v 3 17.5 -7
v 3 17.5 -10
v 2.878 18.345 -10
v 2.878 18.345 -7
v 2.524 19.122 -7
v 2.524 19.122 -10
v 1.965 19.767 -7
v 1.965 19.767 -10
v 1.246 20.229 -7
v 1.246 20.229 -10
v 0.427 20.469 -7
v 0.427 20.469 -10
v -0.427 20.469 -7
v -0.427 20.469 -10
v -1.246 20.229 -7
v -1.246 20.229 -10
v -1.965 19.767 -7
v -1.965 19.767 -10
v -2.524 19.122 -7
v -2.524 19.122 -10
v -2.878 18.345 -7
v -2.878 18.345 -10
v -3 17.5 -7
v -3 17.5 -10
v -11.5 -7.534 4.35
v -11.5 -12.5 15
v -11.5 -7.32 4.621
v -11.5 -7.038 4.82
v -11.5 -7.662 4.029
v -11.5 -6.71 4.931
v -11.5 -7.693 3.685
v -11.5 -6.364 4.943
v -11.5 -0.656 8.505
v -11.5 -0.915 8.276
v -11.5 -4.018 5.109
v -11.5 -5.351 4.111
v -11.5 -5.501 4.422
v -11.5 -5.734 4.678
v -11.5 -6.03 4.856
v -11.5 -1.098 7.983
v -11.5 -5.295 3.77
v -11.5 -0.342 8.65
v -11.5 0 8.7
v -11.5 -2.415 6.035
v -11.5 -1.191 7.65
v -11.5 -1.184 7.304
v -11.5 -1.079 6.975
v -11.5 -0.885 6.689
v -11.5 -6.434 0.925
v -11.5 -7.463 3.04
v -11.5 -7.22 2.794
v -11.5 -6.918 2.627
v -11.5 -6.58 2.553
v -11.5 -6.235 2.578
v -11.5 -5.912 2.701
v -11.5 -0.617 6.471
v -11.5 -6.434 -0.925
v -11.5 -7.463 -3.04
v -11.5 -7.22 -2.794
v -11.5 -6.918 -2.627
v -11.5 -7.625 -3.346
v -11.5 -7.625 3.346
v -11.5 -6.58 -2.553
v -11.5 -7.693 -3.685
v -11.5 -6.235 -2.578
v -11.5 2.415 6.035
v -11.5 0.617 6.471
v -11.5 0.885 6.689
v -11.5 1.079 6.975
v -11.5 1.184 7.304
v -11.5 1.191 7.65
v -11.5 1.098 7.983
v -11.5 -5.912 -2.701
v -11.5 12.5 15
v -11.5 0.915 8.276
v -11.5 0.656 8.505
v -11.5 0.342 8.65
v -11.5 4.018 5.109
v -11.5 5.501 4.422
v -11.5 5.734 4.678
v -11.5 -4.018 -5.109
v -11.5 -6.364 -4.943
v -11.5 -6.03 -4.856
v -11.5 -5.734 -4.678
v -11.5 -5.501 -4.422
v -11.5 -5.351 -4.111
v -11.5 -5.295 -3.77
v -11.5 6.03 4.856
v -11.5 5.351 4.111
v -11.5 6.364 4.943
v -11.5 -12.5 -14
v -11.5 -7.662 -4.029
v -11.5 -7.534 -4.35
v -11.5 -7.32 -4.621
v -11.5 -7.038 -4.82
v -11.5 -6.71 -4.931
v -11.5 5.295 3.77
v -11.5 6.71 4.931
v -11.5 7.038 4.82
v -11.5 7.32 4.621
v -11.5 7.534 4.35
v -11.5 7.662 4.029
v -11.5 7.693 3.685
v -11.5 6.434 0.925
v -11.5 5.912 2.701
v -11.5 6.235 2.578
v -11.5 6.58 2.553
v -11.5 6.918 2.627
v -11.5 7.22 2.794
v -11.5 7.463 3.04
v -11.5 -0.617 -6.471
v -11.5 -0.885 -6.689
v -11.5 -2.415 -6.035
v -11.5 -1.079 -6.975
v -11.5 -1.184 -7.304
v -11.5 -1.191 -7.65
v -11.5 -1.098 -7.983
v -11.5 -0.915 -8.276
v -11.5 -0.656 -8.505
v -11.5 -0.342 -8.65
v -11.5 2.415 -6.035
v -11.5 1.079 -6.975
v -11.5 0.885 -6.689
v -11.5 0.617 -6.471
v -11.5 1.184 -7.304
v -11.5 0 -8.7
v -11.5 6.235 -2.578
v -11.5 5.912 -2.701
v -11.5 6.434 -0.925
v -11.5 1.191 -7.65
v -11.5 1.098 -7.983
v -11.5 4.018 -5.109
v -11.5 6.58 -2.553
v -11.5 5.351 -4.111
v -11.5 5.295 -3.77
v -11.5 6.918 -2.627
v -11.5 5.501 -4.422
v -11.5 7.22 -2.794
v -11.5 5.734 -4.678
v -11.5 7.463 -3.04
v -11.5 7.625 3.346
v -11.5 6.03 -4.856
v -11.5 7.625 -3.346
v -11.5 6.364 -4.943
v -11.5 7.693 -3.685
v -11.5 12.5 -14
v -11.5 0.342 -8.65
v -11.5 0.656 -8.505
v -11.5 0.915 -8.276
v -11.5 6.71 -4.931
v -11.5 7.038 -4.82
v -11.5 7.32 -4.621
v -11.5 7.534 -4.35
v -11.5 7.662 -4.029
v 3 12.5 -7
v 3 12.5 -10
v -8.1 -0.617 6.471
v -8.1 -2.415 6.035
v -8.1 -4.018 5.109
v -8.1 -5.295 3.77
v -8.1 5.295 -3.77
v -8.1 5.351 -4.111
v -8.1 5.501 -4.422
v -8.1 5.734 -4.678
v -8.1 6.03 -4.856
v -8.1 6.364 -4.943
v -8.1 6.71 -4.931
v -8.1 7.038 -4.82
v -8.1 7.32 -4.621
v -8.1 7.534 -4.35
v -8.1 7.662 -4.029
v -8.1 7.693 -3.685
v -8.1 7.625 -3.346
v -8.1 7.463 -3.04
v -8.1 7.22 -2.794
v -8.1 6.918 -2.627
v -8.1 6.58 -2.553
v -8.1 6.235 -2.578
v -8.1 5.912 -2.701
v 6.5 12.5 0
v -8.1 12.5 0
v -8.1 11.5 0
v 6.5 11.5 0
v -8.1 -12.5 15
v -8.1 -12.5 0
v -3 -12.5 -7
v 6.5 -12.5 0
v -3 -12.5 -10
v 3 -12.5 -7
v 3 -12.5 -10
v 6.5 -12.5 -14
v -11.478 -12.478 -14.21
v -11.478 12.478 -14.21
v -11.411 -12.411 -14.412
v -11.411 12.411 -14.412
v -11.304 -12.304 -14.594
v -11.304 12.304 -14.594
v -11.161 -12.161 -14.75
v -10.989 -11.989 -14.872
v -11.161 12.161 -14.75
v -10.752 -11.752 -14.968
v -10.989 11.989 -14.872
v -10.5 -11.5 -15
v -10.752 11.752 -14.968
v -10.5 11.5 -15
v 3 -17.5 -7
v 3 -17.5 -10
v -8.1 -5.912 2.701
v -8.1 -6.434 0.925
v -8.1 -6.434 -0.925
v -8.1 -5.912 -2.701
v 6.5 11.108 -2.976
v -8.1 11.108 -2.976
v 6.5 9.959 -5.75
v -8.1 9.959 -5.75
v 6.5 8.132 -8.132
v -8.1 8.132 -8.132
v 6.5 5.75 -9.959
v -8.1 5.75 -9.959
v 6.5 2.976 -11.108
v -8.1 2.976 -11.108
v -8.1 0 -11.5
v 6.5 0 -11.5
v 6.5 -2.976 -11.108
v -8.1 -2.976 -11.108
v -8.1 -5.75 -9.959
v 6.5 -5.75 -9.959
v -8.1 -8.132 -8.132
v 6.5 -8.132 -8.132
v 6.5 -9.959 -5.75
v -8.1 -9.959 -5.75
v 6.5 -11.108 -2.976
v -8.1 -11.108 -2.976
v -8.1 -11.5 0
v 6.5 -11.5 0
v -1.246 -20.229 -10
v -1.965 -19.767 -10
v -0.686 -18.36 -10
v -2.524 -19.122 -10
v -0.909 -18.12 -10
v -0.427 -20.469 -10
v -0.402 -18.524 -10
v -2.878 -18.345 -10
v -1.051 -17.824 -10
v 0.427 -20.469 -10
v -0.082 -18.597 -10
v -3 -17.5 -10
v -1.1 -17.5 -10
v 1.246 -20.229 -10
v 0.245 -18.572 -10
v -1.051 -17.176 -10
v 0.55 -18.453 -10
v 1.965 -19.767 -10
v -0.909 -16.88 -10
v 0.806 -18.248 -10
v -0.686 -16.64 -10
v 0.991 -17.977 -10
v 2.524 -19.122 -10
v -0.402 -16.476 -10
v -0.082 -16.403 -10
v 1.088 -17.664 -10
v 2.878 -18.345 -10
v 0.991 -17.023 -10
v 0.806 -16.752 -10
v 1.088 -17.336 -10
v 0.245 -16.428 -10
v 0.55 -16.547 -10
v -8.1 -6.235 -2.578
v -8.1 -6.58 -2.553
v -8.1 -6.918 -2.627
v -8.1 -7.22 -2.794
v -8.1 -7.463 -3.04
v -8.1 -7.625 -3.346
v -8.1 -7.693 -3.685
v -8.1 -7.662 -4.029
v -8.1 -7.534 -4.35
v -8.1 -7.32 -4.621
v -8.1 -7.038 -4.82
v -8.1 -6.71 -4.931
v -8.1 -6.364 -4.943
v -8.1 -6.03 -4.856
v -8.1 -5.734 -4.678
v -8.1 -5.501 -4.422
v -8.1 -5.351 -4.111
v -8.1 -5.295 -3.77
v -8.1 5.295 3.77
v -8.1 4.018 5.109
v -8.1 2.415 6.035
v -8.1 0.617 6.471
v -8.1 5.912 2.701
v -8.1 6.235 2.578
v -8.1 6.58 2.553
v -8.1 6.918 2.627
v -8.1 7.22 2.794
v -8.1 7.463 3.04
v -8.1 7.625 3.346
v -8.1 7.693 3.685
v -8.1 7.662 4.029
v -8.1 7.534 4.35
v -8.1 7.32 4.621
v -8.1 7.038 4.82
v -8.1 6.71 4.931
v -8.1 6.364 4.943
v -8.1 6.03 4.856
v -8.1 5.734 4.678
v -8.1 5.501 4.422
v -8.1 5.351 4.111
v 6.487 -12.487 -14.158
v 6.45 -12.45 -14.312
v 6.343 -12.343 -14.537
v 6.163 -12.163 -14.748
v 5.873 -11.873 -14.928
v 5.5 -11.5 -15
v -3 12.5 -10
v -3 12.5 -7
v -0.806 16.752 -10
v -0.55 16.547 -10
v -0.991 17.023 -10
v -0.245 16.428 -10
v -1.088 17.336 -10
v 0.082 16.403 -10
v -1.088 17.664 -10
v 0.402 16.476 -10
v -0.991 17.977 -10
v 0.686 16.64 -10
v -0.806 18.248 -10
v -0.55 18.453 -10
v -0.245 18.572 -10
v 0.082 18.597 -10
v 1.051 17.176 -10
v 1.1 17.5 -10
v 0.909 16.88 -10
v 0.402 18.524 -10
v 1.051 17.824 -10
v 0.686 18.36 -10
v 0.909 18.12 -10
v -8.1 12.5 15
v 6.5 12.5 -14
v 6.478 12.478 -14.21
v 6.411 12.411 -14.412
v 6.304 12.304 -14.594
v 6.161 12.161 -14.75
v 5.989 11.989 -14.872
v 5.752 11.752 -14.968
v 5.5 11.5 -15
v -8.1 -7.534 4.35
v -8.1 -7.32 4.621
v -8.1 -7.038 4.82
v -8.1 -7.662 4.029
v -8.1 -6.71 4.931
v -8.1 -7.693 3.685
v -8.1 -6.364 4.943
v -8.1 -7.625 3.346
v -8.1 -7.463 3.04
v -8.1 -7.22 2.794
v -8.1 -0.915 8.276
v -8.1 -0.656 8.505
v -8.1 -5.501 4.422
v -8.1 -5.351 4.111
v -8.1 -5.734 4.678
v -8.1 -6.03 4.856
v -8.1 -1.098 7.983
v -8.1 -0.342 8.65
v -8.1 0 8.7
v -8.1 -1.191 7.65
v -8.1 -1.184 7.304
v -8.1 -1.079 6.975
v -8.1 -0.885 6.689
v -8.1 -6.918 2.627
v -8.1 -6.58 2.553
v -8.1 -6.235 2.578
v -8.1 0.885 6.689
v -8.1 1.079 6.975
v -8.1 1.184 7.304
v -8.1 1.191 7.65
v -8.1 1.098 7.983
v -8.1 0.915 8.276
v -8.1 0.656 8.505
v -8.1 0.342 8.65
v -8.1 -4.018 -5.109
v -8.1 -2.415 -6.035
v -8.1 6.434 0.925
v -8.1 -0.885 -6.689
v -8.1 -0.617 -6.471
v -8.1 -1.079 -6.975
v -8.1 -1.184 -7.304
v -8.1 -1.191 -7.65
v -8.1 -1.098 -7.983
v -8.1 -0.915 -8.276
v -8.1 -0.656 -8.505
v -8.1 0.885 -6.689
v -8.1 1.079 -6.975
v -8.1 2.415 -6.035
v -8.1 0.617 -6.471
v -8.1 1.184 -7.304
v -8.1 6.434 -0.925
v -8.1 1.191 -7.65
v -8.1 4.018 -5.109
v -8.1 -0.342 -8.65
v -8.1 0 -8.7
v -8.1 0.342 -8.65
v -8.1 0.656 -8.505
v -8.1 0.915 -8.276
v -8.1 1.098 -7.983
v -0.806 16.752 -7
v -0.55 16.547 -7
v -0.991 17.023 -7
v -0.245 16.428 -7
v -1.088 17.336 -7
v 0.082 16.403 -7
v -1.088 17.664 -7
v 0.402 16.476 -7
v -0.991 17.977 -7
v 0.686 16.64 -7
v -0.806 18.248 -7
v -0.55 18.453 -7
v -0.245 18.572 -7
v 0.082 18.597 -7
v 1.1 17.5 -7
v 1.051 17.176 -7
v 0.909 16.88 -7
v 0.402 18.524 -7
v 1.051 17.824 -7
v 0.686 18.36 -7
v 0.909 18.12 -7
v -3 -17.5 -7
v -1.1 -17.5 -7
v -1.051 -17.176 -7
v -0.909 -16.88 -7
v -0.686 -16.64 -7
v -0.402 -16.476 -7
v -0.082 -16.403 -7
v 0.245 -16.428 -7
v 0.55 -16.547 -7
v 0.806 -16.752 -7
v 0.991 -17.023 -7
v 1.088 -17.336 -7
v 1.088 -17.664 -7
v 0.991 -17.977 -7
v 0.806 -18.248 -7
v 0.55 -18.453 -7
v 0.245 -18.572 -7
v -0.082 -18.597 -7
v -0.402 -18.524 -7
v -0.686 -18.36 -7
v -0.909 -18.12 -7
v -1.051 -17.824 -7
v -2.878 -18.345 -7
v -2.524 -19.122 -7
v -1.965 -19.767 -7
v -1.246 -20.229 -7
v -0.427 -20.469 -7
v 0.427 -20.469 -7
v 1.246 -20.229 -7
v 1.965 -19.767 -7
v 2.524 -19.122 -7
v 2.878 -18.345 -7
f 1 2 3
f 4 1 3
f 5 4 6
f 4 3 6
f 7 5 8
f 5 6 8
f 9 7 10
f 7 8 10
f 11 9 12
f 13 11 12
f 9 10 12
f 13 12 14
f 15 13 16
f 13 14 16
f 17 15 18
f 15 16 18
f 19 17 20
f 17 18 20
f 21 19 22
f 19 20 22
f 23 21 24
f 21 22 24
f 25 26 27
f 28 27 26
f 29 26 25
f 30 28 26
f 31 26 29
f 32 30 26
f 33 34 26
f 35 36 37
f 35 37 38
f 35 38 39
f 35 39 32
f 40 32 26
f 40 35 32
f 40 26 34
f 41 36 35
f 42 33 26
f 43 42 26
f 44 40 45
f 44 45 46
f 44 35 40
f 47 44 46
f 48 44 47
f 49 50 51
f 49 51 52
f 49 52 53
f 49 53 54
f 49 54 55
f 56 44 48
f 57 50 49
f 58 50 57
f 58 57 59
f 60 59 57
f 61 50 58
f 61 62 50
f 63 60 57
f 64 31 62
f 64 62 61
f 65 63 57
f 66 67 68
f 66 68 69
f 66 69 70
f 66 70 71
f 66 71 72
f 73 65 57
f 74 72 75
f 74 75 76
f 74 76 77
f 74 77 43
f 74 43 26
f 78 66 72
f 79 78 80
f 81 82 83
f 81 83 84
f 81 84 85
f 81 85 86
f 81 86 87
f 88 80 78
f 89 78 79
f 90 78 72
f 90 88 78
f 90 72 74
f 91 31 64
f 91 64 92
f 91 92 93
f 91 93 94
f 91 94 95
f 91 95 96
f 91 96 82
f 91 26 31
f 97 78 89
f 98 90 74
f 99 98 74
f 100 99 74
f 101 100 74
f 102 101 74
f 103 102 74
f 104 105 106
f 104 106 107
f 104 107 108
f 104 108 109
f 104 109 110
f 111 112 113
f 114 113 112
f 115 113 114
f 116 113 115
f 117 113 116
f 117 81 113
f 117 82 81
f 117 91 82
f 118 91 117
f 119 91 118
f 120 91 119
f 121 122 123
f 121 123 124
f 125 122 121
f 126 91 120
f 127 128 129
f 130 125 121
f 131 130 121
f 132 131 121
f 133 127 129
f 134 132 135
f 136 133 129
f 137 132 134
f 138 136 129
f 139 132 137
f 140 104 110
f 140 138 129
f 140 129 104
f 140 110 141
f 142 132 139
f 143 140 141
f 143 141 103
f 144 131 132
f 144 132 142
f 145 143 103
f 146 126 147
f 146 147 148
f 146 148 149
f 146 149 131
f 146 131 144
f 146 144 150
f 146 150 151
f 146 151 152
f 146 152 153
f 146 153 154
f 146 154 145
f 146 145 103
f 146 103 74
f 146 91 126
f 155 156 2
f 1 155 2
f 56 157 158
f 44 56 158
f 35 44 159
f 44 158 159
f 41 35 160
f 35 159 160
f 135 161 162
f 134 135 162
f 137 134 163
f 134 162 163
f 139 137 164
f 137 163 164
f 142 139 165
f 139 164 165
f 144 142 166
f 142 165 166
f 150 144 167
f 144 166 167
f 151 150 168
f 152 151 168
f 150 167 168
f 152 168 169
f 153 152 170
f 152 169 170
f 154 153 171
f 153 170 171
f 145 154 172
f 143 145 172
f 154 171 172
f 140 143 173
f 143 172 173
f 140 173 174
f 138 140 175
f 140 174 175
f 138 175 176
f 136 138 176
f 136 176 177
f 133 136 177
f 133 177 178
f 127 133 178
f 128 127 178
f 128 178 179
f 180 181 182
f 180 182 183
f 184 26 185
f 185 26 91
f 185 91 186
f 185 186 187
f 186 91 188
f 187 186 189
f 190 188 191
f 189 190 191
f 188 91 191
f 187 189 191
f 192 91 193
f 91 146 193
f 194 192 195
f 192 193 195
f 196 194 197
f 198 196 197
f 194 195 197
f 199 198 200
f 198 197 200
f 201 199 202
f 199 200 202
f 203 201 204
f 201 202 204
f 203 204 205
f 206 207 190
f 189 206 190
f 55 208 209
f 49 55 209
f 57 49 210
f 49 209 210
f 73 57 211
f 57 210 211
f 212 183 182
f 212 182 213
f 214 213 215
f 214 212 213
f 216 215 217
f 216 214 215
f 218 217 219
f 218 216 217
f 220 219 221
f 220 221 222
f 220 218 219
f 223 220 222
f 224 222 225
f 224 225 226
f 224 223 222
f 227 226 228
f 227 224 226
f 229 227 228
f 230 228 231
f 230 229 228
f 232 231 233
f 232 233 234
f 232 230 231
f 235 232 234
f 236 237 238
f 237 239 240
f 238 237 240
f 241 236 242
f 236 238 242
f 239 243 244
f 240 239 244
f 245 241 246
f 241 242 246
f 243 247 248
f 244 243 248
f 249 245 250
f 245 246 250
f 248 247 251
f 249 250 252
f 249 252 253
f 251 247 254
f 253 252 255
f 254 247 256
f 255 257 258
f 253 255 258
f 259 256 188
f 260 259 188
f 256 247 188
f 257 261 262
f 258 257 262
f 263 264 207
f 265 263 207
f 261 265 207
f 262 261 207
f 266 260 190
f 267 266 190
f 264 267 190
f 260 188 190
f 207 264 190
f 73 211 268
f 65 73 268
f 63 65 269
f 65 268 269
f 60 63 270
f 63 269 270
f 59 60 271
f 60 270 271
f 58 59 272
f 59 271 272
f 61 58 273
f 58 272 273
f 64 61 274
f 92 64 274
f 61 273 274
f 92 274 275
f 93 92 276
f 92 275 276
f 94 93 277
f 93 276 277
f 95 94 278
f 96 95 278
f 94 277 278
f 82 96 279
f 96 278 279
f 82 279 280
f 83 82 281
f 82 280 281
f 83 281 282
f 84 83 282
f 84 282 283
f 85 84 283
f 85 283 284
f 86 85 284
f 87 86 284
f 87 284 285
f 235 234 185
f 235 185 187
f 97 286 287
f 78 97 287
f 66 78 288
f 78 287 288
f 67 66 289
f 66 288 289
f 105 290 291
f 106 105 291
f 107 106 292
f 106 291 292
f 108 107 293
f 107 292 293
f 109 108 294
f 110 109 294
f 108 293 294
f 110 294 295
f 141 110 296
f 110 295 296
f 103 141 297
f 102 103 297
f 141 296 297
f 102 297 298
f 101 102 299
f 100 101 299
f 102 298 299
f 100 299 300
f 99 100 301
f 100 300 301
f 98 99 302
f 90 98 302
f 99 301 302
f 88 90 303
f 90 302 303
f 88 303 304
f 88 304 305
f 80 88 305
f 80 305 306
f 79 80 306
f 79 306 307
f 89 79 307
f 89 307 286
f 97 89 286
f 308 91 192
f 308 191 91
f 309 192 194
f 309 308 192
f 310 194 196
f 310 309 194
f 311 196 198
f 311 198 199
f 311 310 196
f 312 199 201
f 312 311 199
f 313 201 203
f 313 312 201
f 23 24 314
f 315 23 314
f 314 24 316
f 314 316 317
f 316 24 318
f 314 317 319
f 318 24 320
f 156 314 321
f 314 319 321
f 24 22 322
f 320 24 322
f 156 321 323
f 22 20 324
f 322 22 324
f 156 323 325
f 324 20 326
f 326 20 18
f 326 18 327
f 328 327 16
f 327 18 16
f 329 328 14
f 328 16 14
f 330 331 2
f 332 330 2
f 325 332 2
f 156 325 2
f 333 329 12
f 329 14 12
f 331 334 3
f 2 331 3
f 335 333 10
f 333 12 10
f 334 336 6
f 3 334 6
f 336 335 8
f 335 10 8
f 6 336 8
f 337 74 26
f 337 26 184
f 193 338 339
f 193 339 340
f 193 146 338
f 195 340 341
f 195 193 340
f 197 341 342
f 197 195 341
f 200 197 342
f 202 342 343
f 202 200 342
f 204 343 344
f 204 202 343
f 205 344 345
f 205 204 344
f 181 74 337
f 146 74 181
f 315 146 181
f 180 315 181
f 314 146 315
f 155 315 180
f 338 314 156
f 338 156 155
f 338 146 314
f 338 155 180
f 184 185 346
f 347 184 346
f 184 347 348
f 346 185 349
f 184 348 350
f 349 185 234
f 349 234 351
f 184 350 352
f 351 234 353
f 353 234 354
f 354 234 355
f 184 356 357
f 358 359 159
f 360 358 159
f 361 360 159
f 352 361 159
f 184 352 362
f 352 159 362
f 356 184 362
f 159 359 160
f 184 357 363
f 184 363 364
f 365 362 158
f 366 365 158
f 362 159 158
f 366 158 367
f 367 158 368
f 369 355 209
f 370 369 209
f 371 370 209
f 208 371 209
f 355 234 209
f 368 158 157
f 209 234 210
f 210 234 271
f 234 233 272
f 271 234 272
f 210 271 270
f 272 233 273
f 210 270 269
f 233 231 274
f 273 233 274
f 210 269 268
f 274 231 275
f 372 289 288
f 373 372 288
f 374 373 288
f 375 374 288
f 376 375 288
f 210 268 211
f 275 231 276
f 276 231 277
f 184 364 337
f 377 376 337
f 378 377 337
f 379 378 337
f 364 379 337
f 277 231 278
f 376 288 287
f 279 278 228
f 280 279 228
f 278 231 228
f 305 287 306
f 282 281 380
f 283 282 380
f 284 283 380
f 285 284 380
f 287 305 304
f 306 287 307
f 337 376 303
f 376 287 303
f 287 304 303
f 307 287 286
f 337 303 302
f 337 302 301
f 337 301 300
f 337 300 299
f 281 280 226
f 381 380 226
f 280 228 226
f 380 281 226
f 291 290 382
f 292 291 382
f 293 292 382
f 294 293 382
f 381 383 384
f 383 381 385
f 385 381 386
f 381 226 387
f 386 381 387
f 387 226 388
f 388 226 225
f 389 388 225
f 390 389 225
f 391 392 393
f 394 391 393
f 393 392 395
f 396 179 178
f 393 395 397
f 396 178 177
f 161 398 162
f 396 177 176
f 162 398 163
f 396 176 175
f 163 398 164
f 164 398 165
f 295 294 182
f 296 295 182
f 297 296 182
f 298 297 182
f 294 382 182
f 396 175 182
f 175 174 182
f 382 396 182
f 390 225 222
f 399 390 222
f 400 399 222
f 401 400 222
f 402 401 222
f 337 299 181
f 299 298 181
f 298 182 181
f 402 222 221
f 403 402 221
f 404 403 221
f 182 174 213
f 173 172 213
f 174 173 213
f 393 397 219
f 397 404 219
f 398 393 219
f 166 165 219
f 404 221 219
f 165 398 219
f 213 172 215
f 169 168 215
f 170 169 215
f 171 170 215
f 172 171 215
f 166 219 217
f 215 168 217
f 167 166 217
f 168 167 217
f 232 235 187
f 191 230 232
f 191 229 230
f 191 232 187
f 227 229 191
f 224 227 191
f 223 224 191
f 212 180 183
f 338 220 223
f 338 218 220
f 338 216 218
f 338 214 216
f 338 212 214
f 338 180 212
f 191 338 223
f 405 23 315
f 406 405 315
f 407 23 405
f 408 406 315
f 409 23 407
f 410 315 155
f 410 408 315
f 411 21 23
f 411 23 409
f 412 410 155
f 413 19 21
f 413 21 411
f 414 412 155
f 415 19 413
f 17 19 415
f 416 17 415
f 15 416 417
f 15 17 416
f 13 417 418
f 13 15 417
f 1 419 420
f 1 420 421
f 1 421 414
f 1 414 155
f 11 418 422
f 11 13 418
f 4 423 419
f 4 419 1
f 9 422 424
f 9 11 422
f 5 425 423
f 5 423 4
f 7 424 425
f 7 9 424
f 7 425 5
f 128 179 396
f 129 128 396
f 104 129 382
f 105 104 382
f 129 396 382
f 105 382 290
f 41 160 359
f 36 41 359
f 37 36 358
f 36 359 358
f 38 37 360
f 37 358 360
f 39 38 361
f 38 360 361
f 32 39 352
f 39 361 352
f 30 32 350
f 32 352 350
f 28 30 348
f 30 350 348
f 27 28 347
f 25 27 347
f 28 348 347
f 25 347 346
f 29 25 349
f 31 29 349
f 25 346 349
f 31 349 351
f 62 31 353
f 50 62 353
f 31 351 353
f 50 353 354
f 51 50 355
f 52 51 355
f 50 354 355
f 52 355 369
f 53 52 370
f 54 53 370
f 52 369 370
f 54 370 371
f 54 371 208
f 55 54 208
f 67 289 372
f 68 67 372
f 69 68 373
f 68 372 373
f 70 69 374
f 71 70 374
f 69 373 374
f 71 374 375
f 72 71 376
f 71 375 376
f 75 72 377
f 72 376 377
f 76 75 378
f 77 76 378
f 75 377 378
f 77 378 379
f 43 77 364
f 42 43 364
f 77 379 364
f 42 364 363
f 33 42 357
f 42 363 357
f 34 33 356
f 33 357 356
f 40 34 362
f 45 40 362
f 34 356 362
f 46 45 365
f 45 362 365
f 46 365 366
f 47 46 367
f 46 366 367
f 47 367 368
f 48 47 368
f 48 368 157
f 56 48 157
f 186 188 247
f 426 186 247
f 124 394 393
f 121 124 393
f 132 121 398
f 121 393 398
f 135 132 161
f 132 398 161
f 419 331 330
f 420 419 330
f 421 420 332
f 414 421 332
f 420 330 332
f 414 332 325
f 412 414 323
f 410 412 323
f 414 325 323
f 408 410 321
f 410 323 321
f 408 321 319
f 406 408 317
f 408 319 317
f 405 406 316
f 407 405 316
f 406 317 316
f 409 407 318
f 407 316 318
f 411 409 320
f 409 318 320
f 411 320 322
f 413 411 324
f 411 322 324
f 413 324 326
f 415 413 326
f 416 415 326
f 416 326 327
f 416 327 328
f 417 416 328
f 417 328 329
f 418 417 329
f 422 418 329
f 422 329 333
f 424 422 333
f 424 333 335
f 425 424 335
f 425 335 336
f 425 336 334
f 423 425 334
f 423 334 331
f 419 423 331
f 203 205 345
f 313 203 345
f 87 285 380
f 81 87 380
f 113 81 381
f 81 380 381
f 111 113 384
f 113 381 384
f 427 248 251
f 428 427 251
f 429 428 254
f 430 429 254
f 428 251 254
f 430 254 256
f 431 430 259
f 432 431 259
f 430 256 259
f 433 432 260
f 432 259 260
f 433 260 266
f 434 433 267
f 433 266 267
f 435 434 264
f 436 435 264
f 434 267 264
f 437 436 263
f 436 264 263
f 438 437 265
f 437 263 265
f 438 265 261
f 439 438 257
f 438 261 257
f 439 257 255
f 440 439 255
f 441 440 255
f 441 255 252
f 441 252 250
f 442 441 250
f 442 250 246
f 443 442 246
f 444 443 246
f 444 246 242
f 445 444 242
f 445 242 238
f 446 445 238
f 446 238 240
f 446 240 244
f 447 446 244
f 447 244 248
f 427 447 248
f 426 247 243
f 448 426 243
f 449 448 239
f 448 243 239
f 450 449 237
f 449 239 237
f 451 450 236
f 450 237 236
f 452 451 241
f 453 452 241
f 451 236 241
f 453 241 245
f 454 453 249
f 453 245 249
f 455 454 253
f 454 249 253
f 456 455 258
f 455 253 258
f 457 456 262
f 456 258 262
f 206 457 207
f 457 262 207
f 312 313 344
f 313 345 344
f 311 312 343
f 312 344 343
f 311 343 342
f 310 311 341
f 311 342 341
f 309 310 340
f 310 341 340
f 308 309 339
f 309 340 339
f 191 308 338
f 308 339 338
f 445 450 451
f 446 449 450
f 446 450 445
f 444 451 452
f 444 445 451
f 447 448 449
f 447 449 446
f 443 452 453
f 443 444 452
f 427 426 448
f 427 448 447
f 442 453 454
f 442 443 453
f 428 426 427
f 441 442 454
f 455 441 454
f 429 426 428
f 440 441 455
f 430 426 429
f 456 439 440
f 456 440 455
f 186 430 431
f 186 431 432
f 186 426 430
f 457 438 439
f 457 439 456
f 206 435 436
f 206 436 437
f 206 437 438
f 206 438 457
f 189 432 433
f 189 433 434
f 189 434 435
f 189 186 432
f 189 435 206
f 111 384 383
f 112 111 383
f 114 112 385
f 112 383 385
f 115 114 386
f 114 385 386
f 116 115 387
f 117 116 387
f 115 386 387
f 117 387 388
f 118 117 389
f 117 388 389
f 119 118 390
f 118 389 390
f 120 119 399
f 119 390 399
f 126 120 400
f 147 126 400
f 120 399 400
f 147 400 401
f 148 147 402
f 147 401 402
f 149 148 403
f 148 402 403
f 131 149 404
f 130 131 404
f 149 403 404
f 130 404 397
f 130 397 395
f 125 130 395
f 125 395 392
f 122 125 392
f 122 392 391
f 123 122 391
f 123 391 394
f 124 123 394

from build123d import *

# Parameters (mm, degrees)
SKETCH_1_W          = 23
SKETCH_1_H          = 25
EXTRUDE_1_DEPTH     = 15
SKETCH_2_W          = 19.6
SKETCH_2_H          = 11.5
SKETCH_4_W          = 3.4
SKETCH_4_H          = 25
EXTRUDE_2_DEPTH     = 15
CUT_EXTRUDE_1_DEPTH = 4
SKETCH_8_R          = 1.1
EXTRUDE_3_DEPTH     = 8
SKETCH_8_2_R        = 1.1
CUT_EXTRUDE_4_DEPTH = 5
SKETCH_7_W          = 35
SKETCH_7_H          = 40
CUT_EXTRUDE_3_DEPTH = 5
FILLET_1_R          = 1


with BuildPart() as part:
    # 草图1 → 凸台-拉伸1 (new body)
    with BuildSketch(Plane.XY):
        Rectangle(SKETCH_1_W, SKETCH_1_H)
    extrude(amount=-EXTRUDE_1_DEPTH)

    # 草图2 → 切除-旋转2 (revolve, cut)
    with BuildSketch(Plane.XY):
        with Locations((1.7, -5.75)):
            Rectangle(SKETCH_2_W, SKETCH_2_H)
    revolve(axis=Axis((11.5, 0, 0), (-1, 0, 0)), mode=Mode.SUBTRACT)

    # 草图4 → 凸台-拉伸2 (add)
    with BuildSketch(Plane.XY):
        with Locations((-9.8, 0)):
            Rectangle(SKETCH_4_W, SKETCH_4_H)
    extrude(amount=EXTRUDE_2_DEPTH)

    # 草图6 → 切除-拉伸1 (cut)
    with BuildSketch(Plane(origin=(-8.1, 0, 0), x_dir=(0, 0, -1), z_dir=(1, 0, 0))):
        with BuildLine():
            ThreePointArc((6.470666667, -0.616824845), (8.7, 0), (6.470666667, 0.616824845))
            ThreePointArc((6.470666667, 0.616824845), (5.629165125, 3.25), (3.769519318, 5.29534929))
            ThreePointArc((3.769519318, 5.29534929), (4.35, 7.534421013), (2.701147348, 5.912174135))
            ThreePointArc((2.701147348, 5.912174135), (0, 6.5), (-2.701147348, 5.912174135))
            ThreePointArc((-2.701147348, 5.912174135), (-4.35, 7.534421013), (-3.769519318, 5.29534929))
            ThreePointArc((-3.769519318, 5.29534929), (-5.629165125, 3.25), (-6.470666667, 0.616824845))
            ThreePointArc((-6.470666667, 0.616824845), (-8.7, 0), (-6.470666667, -0.616824845))
            ThreePointArc((-6.470666667, -0.616824845), (-5.629165125, -3.25), (-3.769519318, -5.29534929))
            ThreePointArc((-3.769519318, -5.29534929), (-4.35, -7.534421013), (-2.701147348, -5.912174135))
            ThreePointArc((-2.701147348, -5.912174135), (0, -6.5), (2.701147348, -5.912174135))
            ThreePointArc((2.701147348, -5.912174135), (4.35, -7.534421013), (3.769519318, -5.29534929))
            ThreePointArc((3.769519318, -5.29534929), (5.629165125, -3.25), (6.470666667, -0.616824845))
        make_face()
    extrude(amount=-CUT_EXTRUDE_1_DEPTH, mode=Mode.SUBTRACT)

    # 草图8 → 凸台-拉伸3 (add)
    # profile 1 of 2: a face of its own
    with BuildSketch(Plane(origin=(0, 0, -15), x_dir=(-1, 0, 0), z_dir=(0, 0, -1))):
        with BuildLine():
            Line((3, 17.5), (3, 12.5))
            Line((3, 12.5), (-3, 12.5))
            Line((-3, 12.5), (-3, 17.5))
            ThreePointArc((-3, 17.5), (0, 20.5), (3, 17.5))
        make_face()
        with Locations((0, 17.5)):
            Circle(SKETCH_8_R, mode=Mode.SUBTRACT)
    # profile 2 of 2: a face of its own
    with BuildSketch(Plane(origin=(0, 0, -15), x_dir=(-1, 0, 0), z_dir=(0, 0, -1))):
        with BuildLine():
            Line((-3, -17.5), (-3, -12.5))
            Line((-3, -12.5), (3, -12.5))
            Line((3, -12.5), (3, -17.5))
            ThreePointArc((3, -17.5), (0, -20.5), (-3, -17.5))
        make_face()
        with Locations((0, -17.5)):
            Circle(SKETCH_8_R, mode=Mode.SUBTRACT)
    extrude(amount=-EXTRUDE_3_DEPTH)

    # 草图8<2> → 切除-拉伸4 (cut)
    # profile 1 of 2: a face of its own
    with BuildSketch(Plane(origin=(0, 0, -15), x_dir=(-1, 0, 0), z_dir=(0, 0, -1))):
        with BuildLine():
            Line((3, 17.5), (3, 12.5))
            Line((3, 12.5), (-3, 12.5))
            Line((-3, 12.5), (-3, 17.5))
            ThreePointArc((-3, 17.5), (0, 20.5), (3, 17.5))
        make_face()
        with Locations((0, 17.5)):
            Circle(SKETCH_8_2_R, mode=Mode.SUBTRACT)
    # profile 2 of 2: a face of its own
    with BuildSketch(Plane(origin=(0, 0, -15), x_dir=(-1, 0, 0), z_dir=(0, 0, -1))):
        with BuildLine():
            Line((-3, -17.5), (-3, -12.5))
            Line((-3, -12.5), (3, -12.5))
            Line((3, -12.5), (3, -17.5))
            ThreePointArc((3, -17.5), (0, -20.5), (-3, -17.5))
        make_face()
        with Locations((0, -17.5)):
            Circle(SKETCH_8_2_R, mode=Mode.SUBTRACT)
    extrude(amount=-CUT_EXTRUDE_4_DEPTH, mode=Mode.SUBTRACT)

    # 草图7 → 切除-拉伸3 (cut)
    with BuildSketch(Plane(origin=(11.5, 0, 0), x_dir=(0, 0, -1), z_dir=(1, 0, 0))):
        with Locations((11.5, 0)):
            Rectangle(SKETCH_7_W, SKETCH_7_H)
    extrude(amount=-CUT_EXTRUDE_3_DEPTH, mode=Mode.SUBTRACT)

    # 圆角1
    fillet_1_edges = [part.edges().sort_by_distance(p)[0] for p in [
        (-2.5, -12.5, -15),
        (-11.5, 0, -15),
        (-2.5, 12.5, -15),
        (6.5, 0, -15),
    ]]
    fillet(fillet_1_edges, radius=FILLET_1_R)


solid = part.part
